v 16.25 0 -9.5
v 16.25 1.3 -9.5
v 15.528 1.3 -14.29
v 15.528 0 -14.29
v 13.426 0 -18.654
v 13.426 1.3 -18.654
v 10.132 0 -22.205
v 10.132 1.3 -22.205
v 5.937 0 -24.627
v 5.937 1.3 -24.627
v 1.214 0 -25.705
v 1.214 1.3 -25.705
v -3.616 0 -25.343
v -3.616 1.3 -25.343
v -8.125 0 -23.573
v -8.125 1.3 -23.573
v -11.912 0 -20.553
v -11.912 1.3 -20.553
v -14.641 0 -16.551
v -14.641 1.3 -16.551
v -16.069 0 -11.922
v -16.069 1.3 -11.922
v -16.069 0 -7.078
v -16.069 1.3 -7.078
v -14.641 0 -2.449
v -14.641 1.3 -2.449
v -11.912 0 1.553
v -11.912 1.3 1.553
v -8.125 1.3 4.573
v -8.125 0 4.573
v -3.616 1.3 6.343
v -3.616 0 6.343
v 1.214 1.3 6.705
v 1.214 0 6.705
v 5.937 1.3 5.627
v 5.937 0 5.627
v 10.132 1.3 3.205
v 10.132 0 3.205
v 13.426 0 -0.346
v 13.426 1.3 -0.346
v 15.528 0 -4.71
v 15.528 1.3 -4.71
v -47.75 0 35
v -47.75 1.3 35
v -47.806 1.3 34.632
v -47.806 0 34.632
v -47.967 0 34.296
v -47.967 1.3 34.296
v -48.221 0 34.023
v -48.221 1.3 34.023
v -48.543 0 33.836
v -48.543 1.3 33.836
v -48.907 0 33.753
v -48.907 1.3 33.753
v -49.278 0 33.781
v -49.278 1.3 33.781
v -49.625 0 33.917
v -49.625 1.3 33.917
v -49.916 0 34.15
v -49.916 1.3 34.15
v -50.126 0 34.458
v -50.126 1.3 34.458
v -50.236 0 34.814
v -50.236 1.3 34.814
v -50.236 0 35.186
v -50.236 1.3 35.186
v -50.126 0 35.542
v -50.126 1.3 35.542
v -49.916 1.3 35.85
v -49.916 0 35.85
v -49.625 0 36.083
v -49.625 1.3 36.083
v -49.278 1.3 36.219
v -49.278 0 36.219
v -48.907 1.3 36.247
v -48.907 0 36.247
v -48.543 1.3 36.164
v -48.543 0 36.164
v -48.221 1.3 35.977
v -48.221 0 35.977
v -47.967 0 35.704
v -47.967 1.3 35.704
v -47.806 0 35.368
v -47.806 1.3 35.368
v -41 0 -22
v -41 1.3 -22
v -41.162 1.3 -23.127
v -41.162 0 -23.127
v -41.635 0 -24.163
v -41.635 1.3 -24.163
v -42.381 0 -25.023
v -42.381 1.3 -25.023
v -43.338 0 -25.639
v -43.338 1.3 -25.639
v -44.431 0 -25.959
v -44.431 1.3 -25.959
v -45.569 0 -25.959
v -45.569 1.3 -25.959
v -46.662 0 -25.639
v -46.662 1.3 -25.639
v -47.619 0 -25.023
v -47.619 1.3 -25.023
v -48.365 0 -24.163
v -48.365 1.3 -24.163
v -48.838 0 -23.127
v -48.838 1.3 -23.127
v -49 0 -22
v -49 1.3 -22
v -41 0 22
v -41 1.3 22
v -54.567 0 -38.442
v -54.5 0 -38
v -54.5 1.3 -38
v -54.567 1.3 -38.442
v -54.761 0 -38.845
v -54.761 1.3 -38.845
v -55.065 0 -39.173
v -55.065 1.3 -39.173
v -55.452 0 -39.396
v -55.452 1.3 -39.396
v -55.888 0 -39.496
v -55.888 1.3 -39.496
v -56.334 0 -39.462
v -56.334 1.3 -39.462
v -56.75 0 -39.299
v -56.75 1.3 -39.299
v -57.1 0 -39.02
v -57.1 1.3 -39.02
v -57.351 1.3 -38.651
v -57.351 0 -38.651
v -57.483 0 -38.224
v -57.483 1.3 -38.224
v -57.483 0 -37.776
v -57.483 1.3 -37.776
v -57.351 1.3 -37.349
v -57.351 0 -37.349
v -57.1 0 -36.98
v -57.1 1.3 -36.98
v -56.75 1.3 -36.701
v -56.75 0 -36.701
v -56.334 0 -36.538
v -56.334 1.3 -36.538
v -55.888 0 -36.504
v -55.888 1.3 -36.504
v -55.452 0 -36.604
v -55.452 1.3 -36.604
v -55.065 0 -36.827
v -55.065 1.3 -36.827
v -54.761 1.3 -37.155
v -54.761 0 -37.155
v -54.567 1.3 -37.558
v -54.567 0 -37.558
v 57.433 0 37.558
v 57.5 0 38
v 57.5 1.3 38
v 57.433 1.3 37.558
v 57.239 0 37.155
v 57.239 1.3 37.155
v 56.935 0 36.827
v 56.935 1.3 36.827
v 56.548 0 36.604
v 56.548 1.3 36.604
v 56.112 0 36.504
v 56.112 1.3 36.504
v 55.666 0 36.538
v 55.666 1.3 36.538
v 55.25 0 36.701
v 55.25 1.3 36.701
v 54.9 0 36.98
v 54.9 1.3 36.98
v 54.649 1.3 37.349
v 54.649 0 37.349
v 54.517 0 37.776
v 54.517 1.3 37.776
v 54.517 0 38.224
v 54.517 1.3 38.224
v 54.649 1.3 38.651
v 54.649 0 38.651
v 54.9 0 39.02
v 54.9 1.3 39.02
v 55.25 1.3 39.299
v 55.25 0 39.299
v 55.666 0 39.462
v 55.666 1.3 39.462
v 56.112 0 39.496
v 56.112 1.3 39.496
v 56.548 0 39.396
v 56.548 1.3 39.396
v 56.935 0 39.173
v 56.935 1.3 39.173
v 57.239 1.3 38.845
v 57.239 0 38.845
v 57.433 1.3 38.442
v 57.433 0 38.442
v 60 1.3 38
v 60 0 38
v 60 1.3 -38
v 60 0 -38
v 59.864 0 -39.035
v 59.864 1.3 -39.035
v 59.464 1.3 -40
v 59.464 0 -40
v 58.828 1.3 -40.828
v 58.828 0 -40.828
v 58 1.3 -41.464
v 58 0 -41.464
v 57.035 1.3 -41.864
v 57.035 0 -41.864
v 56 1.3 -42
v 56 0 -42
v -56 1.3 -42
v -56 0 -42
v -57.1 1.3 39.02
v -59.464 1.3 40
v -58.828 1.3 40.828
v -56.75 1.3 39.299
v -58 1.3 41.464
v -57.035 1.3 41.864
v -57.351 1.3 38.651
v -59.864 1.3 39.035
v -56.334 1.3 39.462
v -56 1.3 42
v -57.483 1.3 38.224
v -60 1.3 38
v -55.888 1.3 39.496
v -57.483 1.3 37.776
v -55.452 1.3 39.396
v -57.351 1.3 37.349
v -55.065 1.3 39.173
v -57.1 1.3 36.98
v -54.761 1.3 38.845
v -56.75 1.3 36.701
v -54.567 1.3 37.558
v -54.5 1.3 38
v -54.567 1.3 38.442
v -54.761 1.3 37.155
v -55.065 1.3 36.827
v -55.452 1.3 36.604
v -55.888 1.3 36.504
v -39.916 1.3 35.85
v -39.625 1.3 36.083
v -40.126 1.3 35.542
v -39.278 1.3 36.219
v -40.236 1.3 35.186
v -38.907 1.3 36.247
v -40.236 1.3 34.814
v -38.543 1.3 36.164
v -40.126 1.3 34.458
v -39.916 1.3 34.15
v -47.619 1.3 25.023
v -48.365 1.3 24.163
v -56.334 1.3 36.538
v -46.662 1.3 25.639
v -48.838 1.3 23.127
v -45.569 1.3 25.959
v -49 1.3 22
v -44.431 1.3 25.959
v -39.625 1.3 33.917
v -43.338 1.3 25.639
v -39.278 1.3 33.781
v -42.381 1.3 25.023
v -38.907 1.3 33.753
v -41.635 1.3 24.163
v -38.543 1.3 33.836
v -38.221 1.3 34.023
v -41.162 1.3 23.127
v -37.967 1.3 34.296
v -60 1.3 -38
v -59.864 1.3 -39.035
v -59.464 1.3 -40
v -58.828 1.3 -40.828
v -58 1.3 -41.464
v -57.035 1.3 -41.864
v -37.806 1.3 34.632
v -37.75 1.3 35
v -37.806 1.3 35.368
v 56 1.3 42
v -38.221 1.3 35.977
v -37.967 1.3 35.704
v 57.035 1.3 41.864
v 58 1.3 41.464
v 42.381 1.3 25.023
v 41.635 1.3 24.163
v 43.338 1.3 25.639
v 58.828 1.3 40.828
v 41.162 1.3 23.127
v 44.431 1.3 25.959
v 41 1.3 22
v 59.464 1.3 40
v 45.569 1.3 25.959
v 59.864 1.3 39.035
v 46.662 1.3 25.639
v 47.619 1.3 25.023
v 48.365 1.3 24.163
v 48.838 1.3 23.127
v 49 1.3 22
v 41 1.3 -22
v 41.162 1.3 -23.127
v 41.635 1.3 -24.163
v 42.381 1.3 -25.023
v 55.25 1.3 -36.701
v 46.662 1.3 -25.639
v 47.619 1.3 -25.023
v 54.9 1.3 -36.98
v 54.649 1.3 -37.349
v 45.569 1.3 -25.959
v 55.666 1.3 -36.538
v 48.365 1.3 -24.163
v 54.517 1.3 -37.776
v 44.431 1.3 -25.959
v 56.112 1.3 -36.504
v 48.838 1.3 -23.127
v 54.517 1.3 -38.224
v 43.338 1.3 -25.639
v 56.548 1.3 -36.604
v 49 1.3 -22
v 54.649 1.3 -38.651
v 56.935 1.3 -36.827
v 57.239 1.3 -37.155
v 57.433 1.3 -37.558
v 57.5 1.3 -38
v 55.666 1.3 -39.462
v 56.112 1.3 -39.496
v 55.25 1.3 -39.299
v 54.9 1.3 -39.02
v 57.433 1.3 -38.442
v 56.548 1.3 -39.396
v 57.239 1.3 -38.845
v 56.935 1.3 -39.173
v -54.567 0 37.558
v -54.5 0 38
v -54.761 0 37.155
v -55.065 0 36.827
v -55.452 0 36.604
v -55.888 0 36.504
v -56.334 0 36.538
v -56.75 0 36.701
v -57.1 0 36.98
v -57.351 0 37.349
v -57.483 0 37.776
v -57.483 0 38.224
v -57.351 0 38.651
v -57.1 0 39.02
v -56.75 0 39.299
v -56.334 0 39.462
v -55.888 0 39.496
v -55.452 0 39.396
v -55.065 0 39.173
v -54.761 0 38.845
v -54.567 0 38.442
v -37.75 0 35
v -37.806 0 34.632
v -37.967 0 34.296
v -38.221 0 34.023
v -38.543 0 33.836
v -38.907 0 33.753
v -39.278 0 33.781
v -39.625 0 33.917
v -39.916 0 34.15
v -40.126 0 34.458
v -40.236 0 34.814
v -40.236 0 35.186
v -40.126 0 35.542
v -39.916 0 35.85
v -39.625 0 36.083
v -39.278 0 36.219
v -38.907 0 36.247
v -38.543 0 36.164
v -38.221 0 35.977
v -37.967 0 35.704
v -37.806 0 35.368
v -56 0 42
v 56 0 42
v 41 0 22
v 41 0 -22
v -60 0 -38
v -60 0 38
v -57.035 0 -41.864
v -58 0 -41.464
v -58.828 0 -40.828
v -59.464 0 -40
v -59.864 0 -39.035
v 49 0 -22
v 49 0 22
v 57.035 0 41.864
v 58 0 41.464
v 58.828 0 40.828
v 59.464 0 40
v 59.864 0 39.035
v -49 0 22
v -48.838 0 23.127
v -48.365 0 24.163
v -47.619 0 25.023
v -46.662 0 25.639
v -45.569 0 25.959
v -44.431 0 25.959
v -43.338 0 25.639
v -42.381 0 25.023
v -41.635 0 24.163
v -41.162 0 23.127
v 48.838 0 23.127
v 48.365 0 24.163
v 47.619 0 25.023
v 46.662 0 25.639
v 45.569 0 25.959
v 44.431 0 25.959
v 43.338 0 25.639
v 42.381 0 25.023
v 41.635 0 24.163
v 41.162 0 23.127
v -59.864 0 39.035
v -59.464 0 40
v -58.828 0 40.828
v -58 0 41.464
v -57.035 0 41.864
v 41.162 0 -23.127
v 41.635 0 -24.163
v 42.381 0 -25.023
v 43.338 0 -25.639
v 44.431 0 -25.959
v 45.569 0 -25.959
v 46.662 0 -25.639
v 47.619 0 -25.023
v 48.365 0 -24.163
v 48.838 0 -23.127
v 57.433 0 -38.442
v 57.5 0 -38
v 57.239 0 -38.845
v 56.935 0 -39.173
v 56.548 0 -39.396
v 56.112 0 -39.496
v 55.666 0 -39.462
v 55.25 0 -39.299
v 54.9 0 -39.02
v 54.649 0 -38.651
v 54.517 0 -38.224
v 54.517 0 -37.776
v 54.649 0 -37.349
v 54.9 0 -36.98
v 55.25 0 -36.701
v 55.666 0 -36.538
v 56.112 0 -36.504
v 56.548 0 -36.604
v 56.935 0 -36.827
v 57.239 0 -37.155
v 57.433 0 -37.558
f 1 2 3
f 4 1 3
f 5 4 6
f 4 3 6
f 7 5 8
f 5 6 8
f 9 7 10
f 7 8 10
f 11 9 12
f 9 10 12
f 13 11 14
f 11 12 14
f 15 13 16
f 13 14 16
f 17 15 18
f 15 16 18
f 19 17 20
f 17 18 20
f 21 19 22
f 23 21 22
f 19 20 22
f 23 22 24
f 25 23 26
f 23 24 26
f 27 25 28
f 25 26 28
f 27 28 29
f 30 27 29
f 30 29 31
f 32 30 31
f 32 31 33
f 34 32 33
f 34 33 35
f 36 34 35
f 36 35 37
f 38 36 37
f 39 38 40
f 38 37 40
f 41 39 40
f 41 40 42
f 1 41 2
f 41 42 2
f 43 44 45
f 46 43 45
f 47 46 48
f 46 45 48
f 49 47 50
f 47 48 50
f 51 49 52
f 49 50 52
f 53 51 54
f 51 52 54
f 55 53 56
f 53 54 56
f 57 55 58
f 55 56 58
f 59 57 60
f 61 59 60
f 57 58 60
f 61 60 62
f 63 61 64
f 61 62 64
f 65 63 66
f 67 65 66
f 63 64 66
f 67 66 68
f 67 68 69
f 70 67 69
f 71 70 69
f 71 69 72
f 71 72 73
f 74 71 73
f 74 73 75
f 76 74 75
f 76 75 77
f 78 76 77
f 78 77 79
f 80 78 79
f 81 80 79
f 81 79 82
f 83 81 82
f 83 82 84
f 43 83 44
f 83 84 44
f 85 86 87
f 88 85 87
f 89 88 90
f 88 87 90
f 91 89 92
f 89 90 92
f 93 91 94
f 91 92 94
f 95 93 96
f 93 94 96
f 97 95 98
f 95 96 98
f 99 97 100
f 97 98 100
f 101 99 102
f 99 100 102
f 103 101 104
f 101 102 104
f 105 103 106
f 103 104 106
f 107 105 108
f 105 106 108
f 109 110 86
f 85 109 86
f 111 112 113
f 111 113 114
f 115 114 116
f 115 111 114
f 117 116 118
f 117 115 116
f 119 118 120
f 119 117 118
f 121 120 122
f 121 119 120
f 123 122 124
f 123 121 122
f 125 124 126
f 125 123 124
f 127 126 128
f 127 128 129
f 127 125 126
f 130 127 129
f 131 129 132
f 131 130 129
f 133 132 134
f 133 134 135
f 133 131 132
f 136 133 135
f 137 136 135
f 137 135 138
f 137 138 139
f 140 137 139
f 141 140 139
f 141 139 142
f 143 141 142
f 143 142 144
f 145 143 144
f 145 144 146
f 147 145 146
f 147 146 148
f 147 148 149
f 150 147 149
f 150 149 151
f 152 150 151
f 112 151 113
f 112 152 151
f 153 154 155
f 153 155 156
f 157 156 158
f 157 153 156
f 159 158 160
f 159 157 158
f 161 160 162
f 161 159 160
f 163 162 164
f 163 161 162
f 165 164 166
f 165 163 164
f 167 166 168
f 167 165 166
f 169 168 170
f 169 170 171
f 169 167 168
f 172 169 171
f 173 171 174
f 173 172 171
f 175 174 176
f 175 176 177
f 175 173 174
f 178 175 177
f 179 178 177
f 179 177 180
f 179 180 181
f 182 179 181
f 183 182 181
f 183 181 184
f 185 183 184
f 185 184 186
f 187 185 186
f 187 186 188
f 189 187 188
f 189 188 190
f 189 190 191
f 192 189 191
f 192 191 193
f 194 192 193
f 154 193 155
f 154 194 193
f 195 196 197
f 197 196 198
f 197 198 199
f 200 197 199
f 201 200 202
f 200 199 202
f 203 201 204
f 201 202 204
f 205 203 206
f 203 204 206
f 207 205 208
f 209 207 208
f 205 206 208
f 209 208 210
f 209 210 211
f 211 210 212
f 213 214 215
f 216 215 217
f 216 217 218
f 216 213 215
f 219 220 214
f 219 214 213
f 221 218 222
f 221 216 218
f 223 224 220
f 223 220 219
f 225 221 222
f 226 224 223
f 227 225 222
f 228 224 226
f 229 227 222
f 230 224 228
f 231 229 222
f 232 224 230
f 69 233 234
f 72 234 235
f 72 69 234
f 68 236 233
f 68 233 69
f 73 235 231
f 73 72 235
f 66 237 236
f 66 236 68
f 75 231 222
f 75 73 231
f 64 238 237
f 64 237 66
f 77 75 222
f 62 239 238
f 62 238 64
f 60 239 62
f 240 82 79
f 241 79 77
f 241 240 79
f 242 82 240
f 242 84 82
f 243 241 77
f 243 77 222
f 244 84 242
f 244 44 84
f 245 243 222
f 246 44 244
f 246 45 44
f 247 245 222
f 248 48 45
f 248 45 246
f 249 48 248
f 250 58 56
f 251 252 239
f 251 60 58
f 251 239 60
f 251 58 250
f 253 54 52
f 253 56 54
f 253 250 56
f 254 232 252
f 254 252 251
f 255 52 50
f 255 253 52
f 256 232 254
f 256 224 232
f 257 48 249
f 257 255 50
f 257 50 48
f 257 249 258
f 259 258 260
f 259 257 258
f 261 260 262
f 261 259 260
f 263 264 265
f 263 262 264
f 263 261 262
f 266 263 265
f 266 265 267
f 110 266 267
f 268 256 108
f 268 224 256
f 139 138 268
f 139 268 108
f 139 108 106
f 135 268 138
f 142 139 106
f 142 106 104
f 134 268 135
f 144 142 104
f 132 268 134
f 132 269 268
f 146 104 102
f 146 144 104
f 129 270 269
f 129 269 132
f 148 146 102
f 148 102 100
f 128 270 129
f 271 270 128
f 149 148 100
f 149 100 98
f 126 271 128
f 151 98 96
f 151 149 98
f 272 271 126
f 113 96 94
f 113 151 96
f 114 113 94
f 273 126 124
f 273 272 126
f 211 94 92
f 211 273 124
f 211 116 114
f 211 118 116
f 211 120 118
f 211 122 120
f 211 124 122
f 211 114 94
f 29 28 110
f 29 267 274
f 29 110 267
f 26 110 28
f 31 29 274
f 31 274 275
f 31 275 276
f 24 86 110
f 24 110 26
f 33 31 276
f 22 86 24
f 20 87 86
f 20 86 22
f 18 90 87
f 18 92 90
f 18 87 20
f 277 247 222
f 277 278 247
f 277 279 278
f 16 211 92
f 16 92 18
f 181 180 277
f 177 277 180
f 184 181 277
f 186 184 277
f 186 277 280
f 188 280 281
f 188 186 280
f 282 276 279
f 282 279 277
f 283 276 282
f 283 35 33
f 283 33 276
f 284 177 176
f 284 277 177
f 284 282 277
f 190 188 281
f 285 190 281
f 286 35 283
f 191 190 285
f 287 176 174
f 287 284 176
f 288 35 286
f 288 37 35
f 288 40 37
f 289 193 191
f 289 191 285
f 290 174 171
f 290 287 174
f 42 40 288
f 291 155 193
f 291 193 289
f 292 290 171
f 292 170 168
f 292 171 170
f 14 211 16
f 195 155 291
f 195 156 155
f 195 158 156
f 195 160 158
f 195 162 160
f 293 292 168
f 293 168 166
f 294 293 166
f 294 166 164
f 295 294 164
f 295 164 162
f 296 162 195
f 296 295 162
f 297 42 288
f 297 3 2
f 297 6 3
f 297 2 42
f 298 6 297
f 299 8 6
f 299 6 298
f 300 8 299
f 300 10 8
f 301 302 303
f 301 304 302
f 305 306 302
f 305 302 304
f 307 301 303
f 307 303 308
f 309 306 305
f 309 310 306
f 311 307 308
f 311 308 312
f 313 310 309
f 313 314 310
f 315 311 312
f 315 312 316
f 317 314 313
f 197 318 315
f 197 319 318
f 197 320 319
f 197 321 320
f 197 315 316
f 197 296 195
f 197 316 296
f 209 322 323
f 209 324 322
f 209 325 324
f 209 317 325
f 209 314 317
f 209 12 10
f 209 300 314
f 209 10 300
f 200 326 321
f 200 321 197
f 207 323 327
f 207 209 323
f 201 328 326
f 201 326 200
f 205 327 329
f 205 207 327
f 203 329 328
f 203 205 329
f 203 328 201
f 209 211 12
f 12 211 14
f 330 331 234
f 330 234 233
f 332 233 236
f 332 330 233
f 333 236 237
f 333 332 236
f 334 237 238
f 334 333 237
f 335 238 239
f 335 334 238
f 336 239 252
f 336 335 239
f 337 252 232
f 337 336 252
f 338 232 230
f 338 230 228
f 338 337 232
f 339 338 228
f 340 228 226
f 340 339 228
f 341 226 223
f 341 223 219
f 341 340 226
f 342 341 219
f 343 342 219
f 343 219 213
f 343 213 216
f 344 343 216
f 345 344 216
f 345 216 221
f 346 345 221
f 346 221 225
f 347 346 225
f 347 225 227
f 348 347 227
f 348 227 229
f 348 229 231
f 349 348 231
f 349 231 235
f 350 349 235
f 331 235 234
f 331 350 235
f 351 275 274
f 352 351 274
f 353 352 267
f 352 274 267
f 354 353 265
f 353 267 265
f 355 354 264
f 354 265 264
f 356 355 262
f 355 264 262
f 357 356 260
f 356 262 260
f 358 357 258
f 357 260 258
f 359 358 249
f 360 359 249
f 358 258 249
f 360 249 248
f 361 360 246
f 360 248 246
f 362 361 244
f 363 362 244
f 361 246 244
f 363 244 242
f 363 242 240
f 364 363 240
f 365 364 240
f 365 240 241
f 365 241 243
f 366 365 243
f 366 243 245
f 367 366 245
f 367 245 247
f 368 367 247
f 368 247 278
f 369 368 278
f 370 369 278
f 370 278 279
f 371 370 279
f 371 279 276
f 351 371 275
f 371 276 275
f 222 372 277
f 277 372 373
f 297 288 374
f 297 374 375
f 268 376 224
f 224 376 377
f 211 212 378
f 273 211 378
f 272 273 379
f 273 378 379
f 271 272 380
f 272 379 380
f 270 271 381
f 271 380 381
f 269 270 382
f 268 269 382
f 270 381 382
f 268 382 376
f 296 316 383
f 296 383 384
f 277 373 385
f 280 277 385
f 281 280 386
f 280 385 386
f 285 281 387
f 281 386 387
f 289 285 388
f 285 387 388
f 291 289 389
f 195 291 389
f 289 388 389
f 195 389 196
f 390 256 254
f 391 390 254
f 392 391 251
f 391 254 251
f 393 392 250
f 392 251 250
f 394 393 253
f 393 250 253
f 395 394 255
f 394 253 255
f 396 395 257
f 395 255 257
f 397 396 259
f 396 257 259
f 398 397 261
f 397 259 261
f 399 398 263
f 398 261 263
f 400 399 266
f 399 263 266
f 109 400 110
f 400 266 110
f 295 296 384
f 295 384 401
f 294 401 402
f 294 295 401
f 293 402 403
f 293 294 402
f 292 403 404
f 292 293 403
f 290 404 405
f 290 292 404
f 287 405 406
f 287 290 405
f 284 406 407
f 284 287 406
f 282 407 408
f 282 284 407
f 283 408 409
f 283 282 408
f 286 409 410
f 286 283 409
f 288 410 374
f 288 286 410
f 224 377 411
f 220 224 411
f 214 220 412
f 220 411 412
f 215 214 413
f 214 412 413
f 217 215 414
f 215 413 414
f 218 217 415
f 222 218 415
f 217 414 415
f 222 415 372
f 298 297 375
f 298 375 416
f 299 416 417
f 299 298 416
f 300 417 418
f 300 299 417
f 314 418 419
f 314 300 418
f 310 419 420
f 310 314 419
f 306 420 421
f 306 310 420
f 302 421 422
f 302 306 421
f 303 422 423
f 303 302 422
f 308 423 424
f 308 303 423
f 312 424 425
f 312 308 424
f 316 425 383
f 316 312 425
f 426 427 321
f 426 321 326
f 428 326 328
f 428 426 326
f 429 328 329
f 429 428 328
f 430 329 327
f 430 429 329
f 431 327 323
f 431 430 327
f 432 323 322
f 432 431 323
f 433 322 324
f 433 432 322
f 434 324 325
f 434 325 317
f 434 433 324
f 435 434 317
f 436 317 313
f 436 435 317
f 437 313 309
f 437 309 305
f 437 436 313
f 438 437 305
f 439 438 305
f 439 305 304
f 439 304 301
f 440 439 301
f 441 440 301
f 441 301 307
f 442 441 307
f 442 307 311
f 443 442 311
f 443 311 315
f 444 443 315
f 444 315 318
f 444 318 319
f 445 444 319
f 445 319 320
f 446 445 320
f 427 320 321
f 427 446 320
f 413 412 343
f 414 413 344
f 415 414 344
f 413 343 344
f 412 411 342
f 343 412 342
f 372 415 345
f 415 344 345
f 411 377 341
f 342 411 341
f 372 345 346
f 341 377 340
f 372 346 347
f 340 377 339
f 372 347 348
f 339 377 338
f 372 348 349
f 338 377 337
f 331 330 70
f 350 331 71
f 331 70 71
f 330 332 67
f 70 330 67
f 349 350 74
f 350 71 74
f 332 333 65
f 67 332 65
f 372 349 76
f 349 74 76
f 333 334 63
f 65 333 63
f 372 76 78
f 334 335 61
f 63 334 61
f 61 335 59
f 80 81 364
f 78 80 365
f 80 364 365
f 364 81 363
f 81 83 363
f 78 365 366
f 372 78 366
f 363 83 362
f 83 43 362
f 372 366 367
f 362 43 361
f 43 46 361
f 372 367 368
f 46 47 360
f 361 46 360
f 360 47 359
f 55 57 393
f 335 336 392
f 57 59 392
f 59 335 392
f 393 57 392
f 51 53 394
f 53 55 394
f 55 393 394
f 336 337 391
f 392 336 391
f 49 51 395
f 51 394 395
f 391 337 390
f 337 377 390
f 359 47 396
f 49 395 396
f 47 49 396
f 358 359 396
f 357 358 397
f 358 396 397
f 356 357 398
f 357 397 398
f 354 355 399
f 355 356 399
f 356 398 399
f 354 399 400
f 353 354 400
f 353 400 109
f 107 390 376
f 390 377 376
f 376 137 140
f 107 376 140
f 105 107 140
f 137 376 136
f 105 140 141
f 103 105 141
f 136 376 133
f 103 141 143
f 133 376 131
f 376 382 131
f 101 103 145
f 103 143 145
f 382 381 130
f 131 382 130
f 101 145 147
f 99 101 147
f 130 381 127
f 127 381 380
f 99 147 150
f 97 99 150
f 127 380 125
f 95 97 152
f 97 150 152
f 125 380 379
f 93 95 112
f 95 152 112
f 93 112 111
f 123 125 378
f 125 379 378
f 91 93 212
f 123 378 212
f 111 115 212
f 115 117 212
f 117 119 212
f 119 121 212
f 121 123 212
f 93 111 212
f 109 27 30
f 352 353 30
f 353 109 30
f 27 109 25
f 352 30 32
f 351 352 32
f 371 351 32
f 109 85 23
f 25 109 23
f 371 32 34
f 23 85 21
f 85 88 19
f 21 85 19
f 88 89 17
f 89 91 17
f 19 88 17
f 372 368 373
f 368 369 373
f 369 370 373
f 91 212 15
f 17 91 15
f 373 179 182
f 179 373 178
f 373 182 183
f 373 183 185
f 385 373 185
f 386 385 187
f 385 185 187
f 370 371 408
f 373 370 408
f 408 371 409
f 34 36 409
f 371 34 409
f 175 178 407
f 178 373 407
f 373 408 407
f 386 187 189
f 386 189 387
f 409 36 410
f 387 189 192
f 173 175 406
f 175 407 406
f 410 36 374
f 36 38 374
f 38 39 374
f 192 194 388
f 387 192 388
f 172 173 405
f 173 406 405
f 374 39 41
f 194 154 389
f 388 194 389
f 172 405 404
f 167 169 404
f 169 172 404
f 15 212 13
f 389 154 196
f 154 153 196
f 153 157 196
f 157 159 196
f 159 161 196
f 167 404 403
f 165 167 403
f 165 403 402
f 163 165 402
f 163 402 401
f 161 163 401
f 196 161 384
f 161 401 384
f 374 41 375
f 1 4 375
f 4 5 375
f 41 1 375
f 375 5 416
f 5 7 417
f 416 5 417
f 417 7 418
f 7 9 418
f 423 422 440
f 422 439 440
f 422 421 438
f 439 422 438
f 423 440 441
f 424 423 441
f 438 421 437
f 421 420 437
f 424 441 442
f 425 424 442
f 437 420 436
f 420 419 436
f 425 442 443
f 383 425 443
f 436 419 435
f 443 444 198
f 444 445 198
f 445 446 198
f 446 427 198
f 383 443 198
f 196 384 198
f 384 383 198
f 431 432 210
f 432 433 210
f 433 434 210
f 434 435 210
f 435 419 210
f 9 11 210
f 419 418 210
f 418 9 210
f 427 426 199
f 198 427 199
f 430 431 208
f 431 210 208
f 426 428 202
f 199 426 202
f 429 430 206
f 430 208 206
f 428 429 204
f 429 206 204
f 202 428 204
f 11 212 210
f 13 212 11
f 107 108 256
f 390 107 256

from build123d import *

# Parameters (mm, degrees)
SKETCH1_R           = 1.5
BOSS_EXTRUDE1_DEPTH = 1.3
SKETCH2_R           = 16.25
SKETCH2_R_2         = 1.25
CUT_EXTRUDE1_DEPTH  = 1.3


with BuildPart() as part:
    # Sketch1 → Boss-Extrude1 (new body)
    with BuildSketch(Plane(origin=(0, 0, 0), x_dir=(1, 0, 0), z_dir=(0, 1, 0))):
        with BuildLine():
            Line((-56, -42), (56, -42))
            ThreePointArc((56, -42), (58.828427125, -40.828427125), (60, -38))
            Line((60, -38), (60, 38))
            ThreePointArc((60, 38), (58.828427125, 40.828427125), (56, 42))
            Line((56, 42), (-56, 42))
            ThreePointArc((-56, 42), (-58.828427125, 40.828427125), (-60, 38))
            Line((-60, 38), (-60, -38))
            ThreePointArc((-60, -38), (-58.828427125, -40.828427125), (-56, -42))
        make_face()
        with Locations((-56, 38)):
            Circle(SKETCH1_R, mode=Mode.SUBTRACT)
        with Locations((56, 38)):
            Circle(SKETCH1_R, mode=Mode.SUBTRACT)
        with Locations((56, -38)):
            Circle(SKETCH1_R, mode=Mode.SUBTRACT)
        with Locations((-56, -38)):
            Circle(SKETCH1_R, mode=Mode.SUBTRACT)
    extrude(amount=BOSS_EXTRUDE1_DEPTH)

    # Sketch2 → Cut-Extrude1 (cut)
    with BuildSketch(Plane(origin=(0, 1.3, 0), x_dir=(1, 0, 0), z_dir=(0, 1, 0))):
        with Locations((0, 9.5)):
            Circle(SKETCH2_R)
        with Locations((-49, -35)):
            Circle(SKETCH2_R_2)
        with Locations((-39, -35)):
            Circle(SKETCH2_R_2)
        with BuildLine():
            Line((-49, 22), (-49, -22))
            ThreePointArc((-49, -22), (-45, -26), (-41, -22))
            Line((-41, -22), (-41, 22))
            ThreePointArc((-41, 22), (-45, 26), (-49, 22))
        make_face()
        with BuildLine():
            Line((49, 22), (49, -22))
            ThreePointArc((49, -22), (45, -26), (41, -22))
            Line((41, -22), (41, 22))
            ThreePointArc((41, 22), (45, 26), (49, 22))
        make_face()
    extrude(amount=-CUT_EXTRUDE1_DEPTH, mode=Mode.SUBTRACT)


solid = part.part
